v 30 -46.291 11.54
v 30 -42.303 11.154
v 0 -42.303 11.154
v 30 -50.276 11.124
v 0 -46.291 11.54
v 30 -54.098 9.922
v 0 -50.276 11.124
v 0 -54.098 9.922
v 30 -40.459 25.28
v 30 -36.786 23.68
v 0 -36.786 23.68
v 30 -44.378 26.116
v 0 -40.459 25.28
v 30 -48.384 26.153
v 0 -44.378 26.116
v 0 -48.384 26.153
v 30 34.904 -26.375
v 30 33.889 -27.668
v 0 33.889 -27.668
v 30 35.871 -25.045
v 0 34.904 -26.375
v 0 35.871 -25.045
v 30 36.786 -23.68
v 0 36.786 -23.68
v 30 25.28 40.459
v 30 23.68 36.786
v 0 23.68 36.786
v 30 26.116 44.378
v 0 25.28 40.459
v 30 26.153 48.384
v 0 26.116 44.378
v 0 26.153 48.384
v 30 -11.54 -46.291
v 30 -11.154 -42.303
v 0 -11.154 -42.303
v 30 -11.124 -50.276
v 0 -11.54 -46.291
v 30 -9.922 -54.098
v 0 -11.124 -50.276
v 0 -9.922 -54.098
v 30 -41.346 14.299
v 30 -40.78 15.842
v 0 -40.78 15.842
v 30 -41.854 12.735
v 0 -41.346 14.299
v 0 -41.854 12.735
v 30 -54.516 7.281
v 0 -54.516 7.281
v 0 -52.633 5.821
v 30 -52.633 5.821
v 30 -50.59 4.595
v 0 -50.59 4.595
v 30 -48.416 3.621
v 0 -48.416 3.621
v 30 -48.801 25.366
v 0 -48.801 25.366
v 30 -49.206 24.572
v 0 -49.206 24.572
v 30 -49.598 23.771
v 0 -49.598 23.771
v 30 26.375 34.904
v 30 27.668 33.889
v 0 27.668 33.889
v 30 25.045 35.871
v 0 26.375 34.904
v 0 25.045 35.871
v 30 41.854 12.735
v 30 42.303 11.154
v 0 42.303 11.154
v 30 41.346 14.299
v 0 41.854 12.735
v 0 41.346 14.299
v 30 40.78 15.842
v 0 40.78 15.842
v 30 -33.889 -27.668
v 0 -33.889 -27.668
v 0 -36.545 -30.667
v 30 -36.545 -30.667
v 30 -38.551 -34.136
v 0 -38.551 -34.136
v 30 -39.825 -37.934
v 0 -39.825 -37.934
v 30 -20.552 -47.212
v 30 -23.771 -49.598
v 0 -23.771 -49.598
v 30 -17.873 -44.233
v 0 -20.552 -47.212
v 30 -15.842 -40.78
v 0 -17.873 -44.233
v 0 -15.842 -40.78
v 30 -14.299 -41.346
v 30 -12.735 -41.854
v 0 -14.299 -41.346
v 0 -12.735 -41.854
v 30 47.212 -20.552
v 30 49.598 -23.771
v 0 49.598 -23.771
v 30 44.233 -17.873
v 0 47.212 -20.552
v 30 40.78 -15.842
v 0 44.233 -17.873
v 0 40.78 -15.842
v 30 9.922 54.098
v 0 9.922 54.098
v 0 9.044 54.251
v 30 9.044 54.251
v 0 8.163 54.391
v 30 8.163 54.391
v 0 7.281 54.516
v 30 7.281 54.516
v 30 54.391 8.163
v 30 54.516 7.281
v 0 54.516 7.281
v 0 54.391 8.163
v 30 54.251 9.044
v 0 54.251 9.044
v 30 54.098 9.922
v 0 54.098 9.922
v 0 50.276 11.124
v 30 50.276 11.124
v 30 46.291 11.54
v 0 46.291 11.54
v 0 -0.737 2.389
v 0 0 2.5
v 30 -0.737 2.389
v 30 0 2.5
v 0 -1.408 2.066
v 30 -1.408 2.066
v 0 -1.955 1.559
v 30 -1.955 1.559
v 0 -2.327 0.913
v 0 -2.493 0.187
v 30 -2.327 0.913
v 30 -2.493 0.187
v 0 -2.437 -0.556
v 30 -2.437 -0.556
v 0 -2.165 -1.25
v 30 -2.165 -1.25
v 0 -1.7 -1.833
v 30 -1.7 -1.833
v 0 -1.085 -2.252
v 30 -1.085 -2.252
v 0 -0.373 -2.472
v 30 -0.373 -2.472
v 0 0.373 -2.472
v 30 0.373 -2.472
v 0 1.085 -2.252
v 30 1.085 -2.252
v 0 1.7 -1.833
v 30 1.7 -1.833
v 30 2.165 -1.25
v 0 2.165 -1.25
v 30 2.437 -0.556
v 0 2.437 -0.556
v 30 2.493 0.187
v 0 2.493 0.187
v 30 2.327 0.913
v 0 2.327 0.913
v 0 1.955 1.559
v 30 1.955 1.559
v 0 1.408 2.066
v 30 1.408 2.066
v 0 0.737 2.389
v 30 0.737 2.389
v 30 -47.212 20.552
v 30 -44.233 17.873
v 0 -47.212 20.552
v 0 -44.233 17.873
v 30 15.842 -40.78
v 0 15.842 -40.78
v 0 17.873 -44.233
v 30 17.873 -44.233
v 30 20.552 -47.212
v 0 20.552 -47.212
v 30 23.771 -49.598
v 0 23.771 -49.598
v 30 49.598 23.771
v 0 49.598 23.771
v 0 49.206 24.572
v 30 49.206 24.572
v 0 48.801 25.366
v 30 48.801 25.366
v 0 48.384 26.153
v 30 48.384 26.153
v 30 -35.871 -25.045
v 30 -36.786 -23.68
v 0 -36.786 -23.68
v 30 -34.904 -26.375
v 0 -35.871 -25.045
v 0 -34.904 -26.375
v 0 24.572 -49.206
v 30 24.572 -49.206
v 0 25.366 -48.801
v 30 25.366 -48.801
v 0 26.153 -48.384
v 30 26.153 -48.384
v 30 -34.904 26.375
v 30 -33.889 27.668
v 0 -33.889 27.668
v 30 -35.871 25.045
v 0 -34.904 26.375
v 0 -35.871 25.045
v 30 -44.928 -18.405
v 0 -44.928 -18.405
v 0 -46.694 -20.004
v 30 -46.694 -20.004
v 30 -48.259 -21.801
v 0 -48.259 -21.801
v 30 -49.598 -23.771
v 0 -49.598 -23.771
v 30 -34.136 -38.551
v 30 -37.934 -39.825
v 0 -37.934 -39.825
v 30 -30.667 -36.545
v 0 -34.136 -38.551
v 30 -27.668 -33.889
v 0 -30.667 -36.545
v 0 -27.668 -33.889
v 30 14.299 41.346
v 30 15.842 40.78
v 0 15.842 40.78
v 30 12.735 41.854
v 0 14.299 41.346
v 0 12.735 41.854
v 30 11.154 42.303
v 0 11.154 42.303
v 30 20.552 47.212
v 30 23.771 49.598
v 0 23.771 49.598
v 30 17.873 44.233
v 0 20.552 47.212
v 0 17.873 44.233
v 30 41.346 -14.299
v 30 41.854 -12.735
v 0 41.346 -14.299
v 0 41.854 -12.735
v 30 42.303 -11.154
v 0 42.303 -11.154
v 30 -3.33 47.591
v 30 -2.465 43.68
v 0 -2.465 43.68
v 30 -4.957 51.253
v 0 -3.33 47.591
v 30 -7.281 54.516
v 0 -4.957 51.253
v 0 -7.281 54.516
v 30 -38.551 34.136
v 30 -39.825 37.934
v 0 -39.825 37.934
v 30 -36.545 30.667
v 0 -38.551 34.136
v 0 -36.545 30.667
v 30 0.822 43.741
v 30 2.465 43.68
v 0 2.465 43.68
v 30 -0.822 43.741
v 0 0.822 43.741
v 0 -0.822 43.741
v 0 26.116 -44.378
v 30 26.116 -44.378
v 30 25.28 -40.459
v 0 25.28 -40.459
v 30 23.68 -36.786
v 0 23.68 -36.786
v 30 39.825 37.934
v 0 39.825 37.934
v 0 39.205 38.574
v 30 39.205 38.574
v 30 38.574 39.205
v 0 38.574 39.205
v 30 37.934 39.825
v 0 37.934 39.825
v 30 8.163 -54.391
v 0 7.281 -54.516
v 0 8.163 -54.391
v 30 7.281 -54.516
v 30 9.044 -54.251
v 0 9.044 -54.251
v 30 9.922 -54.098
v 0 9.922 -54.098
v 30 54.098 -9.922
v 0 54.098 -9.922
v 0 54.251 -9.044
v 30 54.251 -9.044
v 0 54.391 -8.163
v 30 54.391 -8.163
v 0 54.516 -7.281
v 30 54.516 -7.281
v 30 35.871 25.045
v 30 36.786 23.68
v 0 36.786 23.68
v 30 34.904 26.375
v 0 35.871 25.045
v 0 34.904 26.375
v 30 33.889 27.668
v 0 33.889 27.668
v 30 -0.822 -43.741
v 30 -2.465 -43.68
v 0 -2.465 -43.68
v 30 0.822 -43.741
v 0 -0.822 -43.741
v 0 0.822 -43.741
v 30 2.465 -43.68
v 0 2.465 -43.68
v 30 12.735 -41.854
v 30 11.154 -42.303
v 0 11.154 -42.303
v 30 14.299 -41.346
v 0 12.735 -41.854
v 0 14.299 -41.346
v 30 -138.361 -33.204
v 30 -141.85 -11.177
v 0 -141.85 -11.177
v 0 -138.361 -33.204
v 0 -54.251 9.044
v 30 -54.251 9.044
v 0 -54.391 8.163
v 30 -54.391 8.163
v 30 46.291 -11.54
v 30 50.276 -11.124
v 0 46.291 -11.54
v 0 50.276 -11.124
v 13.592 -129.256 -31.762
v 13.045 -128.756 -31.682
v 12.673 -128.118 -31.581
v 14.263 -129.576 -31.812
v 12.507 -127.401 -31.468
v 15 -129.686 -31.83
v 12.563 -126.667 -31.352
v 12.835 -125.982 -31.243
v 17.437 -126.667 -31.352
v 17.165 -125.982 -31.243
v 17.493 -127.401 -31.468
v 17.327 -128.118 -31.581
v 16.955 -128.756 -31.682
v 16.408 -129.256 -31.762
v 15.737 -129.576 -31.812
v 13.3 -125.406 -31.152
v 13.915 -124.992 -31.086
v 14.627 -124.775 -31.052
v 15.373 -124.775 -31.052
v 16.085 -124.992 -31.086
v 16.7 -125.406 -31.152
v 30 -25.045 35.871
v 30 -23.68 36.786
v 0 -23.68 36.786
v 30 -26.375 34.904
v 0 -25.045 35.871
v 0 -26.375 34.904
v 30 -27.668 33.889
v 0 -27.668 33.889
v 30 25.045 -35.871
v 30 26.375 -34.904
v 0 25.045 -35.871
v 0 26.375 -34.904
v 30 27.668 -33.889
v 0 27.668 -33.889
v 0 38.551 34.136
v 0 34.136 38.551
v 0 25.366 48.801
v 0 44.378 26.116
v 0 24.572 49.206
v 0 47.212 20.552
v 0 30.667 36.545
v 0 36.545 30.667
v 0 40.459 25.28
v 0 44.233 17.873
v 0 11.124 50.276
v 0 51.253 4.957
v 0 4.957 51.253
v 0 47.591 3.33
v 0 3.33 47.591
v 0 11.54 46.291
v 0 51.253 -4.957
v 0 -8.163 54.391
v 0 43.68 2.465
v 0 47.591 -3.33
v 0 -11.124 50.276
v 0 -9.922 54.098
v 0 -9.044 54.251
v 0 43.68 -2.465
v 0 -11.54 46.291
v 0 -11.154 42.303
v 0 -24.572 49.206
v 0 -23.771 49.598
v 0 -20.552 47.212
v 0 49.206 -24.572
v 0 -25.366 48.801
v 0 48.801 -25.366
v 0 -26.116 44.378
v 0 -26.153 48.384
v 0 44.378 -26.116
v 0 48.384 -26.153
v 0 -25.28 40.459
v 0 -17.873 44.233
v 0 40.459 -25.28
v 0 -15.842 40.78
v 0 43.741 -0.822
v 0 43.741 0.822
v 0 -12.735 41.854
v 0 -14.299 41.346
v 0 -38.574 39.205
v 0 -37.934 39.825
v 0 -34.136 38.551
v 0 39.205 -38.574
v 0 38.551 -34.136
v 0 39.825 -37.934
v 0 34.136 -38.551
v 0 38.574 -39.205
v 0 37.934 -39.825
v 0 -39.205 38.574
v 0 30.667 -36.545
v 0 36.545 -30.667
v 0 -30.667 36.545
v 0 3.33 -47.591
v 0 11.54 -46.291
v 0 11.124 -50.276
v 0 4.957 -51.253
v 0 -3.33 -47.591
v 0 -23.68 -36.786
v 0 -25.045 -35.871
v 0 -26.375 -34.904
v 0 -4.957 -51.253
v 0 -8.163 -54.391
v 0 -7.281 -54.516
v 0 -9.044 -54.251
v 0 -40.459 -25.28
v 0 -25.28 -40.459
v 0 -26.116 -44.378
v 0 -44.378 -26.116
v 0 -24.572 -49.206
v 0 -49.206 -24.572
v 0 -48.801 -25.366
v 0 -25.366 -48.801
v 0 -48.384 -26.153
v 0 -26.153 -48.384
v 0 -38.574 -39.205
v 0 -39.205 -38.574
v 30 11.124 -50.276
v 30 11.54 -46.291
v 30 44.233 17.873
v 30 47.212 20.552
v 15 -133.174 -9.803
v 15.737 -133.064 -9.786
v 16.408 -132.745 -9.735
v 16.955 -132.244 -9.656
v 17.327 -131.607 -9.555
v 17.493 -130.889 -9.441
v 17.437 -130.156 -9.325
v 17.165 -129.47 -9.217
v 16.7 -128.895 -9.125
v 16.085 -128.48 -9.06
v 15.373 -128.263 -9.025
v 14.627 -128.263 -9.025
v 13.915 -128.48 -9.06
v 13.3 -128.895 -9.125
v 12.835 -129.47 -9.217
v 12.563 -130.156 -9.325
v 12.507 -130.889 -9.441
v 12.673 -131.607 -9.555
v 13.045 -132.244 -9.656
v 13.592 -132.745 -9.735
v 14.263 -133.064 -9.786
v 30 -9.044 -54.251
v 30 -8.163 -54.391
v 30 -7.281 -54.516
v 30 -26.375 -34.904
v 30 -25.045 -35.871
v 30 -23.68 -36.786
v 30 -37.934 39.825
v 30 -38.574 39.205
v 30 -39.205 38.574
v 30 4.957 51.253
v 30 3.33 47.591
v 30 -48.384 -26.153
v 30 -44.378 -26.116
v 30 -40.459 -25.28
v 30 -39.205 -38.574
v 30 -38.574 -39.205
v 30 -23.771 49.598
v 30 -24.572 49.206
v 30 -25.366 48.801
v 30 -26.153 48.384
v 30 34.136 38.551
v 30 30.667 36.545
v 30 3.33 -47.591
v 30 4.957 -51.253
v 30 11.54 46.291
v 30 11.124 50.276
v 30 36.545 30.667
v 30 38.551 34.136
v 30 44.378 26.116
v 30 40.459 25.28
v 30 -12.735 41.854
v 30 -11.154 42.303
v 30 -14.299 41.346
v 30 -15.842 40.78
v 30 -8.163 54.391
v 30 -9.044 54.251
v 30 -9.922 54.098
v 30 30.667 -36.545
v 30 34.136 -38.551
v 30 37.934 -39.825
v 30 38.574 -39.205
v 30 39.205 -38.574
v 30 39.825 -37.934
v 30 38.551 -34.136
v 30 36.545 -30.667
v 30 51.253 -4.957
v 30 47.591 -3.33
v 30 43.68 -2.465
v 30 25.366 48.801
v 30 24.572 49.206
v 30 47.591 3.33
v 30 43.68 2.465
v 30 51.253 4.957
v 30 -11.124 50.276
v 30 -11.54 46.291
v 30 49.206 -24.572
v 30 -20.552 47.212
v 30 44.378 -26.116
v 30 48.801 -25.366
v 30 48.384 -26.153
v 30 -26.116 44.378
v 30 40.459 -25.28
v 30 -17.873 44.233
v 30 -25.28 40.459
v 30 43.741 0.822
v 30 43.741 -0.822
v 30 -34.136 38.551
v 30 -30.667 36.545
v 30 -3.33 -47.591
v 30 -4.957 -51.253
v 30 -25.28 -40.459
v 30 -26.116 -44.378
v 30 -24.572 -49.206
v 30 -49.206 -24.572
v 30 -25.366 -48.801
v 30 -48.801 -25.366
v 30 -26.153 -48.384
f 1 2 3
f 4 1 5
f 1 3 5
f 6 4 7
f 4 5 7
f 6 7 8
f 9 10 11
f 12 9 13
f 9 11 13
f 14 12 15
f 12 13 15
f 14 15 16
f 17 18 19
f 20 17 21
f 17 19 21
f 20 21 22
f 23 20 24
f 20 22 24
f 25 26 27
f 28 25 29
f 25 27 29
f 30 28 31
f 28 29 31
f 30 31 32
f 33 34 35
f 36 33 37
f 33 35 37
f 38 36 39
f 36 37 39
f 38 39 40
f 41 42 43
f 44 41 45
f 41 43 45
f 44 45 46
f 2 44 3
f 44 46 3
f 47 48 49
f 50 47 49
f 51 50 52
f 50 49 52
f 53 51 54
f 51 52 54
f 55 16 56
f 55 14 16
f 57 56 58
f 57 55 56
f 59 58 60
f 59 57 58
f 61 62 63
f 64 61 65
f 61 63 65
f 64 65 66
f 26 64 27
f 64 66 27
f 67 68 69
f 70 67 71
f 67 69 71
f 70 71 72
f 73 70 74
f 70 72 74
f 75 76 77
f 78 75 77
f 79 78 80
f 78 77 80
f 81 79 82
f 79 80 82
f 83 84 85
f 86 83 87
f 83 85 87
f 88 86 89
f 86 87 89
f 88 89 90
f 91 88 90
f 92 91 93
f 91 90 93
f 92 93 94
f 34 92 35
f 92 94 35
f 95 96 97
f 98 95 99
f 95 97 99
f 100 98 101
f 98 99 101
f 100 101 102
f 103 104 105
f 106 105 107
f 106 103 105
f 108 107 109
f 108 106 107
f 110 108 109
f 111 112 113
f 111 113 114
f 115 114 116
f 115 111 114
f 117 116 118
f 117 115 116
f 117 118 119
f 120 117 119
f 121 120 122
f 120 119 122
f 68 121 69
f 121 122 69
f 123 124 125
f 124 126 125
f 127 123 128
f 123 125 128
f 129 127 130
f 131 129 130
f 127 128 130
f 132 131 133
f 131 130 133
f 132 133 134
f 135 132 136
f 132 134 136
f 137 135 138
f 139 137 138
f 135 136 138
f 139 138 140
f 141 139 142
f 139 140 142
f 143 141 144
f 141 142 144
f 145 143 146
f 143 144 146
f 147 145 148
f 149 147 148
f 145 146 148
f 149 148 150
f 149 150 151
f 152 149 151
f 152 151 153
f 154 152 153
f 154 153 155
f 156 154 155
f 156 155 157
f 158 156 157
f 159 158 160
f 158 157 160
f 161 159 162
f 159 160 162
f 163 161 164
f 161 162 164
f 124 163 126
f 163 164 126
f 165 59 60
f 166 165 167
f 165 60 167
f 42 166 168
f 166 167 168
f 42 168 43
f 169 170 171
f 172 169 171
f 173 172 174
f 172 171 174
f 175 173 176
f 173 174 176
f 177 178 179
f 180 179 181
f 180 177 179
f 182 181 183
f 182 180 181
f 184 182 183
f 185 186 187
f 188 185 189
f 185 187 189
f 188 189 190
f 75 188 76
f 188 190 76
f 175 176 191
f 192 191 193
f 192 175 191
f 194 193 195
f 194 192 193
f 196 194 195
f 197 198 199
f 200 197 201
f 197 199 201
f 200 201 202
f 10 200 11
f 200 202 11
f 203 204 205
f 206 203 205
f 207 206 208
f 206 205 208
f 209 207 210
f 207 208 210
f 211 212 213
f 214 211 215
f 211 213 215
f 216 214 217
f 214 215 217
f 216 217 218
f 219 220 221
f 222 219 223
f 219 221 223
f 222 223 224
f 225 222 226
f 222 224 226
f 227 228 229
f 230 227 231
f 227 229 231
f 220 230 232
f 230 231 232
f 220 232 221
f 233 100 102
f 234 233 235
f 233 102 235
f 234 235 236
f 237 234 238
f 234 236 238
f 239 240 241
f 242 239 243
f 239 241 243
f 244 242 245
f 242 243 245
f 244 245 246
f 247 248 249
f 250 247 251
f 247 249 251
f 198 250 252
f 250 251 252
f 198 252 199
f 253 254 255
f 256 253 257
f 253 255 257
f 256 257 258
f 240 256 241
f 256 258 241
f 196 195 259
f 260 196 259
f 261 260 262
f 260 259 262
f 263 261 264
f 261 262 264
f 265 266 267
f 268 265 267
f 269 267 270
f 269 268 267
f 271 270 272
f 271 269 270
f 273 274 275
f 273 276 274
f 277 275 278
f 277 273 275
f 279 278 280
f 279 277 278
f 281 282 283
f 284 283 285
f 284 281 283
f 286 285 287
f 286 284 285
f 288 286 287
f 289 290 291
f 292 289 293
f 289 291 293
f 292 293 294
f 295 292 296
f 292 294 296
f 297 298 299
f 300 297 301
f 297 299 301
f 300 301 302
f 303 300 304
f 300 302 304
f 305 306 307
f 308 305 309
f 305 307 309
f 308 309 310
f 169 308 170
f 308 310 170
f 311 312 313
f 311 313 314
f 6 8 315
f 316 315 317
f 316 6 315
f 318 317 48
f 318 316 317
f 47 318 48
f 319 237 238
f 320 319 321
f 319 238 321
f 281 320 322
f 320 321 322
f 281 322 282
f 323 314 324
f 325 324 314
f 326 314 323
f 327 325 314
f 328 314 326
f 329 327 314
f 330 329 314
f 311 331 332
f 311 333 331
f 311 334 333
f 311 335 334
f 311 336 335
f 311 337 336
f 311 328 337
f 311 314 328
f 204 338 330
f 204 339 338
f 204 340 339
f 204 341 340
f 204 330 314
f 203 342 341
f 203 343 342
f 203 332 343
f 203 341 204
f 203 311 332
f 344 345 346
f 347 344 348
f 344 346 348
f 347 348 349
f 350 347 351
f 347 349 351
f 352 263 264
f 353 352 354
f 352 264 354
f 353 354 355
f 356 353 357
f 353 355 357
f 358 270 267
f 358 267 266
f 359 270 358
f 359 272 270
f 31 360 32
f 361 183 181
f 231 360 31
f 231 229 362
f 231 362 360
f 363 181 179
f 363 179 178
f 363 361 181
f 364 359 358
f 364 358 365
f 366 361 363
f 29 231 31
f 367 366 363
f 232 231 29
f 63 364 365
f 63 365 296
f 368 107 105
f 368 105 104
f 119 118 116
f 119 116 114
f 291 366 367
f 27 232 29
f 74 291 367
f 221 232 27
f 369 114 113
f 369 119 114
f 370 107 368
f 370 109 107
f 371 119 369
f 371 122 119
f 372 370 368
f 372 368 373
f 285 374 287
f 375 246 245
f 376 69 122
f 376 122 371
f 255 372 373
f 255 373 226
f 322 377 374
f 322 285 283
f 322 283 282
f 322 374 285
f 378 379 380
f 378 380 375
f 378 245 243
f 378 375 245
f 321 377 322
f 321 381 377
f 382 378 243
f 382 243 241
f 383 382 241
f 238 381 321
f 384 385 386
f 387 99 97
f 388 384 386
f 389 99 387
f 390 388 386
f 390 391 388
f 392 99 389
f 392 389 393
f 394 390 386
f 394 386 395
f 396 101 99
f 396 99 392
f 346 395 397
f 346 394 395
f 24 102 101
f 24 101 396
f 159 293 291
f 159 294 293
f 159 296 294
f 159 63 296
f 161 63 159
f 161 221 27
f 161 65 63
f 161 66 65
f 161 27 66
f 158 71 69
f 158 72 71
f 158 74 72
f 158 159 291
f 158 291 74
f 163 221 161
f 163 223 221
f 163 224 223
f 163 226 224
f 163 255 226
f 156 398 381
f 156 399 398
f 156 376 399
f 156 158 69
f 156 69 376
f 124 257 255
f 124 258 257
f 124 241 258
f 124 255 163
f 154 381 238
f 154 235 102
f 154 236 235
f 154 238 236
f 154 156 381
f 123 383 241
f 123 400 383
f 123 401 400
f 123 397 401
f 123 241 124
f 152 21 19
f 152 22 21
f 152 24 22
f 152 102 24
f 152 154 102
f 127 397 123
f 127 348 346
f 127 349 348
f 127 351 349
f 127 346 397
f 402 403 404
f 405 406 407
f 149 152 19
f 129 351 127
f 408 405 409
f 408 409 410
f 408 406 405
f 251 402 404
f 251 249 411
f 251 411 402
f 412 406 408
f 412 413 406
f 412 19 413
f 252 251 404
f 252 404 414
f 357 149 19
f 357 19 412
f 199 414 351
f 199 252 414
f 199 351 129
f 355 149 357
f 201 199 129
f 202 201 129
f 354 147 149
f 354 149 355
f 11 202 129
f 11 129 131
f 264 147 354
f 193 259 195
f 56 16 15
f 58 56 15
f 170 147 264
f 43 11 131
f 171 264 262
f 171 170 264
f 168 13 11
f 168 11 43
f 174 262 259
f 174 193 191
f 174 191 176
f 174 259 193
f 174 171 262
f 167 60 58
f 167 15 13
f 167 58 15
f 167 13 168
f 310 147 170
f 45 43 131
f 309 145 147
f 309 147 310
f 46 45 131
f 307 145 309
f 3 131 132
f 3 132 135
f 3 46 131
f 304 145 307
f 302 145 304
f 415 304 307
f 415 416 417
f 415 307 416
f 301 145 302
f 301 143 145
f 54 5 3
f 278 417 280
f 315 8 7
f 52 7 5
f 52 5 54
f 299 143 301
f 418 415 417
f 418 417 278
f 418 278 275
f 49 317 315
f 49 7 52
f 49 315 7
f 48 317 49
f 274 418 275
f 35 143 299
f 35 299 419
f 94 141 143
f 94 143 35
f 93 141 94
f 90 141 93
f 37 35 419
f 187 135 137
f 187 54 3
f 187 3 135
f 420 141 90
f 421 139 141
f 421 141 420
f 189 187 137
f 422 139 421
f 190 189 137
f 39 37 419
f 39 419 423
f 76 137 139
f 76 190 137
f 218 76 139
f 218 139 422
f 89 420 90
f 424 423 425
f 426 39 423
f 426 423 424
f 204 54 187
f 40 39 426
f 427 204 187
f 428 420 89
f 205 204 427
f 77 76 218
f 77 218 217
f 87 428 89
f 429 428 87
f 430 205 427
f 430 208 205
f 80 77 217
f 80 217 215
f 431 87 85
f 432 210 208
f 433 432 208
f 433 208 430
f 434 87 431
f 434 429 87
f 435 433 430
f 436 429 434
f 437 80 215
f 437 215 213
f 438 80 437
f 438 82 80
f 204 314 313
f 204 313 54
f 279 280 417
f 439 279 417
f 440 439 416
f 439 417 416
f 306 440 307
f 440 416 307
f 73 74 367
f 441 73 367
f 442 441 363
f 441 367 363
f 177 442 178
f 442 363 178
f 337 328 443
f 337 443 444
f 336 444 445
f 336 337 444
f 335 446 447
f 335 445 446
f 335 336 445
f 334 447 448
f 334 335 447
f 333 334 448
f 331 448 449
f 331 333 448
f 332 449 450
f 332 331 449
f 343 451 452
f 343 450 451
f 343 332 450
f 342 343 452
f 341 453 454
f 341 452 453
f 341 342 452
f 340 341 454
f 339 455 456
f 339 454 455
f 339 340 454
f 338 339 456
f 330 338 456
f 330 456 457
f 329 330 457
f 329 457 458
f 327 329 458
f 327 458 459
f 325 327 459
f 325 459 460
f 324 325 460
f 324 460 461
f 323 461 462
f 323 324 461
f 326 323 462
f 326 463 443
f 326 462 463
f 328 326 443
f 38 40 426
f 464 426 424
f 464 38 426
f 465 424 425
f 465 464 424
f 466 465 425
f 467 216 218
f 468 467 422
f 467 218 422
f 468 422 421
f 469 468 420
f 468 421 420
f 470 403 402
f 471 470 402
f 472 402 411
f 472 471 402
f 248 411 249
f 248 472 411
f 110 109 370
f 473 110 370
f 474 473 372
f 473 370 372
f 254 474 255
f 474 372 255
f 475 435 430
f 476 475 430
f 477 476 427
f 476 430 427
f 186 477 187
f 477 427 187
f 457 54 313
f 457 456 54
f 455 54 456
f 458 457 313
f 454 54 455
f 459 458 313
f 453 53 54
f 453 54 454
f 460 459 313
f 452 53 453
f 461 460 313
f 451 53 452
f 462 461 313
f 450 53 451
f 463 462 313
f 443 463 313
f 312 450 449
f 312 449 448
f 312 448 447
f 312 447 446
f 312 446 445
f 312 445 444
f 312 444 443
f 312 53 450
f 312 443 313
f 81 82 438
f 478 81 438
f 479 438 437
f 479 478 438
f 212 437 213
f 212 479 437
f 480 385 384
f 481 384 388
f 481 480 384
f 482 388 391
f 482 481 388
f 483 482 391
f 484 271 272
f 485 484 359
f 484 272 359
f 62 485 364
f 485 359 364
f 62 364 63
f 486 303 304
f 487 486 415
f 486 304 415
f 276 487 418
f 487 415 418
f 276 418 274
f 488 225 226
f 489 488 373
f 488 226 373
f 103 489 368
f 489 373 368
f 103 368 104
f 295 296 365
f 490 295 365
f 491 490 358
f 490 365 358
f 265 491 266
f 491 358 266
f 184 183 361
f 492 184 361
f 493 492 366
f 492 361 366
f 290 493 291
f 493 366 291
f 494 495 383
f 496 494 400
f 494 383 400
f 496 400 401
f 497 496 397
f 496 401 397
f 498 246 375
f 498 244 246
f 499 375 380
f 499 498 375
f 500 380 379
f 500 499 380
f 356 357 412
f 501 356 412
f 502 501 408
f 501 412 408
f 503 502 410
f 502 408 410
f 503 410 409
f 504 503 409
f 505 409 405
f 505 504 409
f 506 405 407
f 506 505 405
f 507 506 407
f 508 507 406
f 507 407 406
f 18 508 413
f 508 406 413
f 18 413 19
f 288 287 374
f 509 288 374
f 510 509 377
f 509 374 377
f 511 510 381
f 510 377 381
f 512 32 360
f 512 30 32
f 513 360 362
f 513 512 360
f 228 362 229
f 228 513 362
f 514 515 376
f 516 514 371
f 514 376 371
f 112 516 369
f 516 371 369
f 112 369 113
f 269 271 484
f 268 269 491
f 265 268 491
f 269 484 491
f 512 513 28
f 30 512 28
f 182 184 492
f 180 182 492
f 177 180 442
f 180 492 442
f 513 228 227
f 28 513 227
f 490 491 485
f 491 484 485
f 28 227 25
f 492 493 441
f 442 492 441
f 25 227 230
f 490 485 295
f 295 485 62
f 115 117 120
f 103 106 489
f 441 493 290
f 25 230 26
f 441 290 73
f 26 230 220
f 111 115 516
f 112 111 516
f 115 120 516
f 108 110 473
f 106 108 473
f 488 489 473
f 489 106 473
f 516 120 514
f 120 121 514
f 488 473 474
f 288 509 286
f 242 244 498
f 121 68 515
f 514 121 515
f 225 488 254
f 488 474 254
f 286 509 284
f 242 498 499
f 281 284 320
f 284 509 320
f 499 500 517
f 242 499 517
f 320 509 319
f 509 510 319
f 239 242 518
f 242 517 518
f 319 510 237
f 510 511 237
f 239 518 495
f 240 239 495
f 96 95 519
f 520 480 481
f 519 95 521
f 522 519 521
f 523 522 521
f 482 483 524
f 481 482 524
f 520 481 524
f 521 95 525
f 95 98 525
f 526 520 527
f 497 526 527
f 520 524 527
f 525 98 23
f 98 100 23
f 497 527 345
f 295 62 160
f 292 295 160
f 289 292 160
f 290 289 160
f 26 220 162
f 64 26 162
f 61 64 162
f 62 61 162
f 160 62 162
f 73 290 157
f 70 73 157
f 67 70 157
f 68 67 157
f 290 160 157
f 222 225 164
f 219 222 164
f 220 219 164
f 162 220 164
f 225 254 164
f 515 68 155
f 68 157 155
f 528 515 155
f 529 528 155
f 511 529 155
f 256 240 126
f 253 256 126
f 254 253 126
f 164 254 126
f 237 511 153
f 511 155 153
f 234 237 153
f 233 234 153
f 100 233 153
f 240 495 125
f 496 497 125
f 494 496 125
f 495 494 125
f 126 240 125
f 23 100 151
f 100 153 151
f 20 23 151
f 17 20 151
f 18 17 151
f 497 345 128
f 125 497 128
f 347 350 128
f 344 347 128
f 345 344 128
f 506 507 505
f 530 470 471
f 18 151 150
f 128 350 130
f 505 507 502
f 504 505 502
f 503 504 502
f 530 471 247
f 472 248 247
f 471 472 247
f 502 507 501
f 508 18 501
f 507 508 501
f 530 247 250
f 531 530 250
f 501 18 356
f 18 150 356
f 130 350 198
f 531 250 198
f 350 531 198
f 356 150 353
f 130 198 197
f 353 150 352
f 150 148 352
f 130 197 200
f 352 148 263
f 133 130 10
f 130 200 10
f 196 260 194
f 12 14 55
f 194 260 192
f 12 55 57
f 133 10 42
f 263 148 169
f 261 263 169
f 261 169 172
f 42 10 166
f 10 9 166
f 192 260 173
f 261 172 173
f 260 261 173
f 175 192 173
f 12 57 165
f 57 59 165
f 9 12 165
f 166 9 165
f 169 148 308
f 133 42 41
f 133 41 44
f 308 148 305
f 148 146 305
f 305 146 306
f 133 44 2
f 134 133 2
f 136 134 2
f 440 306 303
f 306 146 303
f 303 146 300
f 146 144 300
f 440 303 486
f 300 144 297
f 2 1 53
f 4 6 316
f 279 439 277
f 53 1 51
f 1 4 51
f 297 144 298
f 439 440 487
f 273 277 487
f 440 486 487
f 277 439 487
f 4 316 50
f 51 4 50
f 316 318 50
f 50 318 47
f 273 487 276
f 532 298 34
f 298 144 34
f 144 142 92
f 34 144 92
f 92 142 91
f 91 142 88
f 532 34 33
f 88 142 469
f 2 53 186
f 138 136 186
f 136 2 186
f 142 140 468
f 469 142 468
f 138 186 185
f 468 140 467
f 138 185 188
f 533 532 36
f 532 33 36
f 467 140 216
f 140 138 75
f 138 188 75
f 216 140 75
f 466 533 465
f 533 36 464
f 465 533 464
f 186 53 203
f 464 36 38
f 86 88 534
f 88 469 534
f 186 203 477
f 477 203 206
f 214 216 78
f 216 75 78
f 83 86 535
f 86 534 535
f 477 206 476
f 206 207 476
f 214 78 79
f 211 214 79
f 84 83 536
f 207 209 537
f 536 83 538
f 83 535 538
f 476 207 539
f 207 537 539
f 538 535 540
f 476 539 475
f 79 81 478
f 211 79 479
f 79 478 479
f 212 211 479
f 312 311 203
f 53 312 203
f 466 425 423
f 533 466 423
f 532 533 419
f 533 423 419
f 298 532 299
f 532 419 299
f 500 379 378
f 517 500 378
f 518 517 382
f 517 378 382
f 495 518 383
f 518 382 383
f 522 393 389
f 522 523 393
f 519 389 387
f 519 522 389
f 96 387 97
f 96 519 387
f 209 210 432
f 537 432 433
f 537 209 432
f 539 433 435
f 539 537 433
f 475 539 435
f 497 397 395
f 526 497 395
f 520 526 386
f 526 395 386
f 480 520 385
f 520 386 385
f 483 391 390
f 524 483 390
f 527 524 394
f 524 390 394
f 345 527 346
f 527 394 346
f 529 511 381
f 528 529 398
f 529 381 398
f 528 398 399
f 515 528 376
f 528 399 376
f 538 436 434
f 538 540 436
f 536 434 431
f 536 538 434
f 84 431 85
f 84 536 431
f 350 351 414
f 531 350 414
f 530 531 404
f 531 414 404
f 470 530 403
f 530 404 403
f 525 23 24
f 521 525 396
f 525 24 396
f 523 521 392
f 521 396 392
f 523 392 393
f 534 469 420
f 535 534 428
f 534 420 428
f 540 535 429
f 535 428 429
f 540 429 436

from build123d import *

# Parameters (mm, degrees)
BASPROSKE_W              = 30
BASPROSKE_H              = 55
TOOTHCUT_DEPTH           = 84.366660003
TEETHCUTS_COUNT          = 20
BORSKE_R                 = 2.5
BORE_DEPTH               = 50.0000508
EXTRUDE_1_DEPTH          = 30
CUT_EXTRUDE_1_DEPTH      = 158.555338193
CUT_EXTRUDE_1_DEPTH_BACK = 158.555338193
SKETCH_7_R               = 2.5


with BuildPart() as part:
    # BasProSke → Base-Revolve (revolve)
    with BuildSketch(Plane(origin=(0, 0, 0), x_dir=(1, 0, 0), z_dir=(0, 1, 0)), mode=Mode.PRIVATE) as base_revolve_sk:
        with Locations((15, 27.5)):
            Rectangle(BASPROSKE_W, BASPROSKE_H)
    revolve(base_revolve_sk.sketch.rotate(Axis((-10, 0, 0), (1, 0, 0)), 180), axis=Axis((-10, 0, 0), (1, 0, 0)))

    # TooCutSke → ToothCut (cut, through all)
    with BuildSketch(Plane(origin=(0, 0, 0), x_dir=(0, 0, -1), z_dir=(1, 0, 0))):
        with BuildLine():
            ThreePointArc((2.464838288, 43.679509764), (0, 43.749), (-2.464838288, 43.679509764))
            ThreePointArc((-2.464838288, 43.679509764), (-4.057398861, 49.476814676), (-7.300899231, 54.538899105))
            ThreePointArc((-7.300899231, 54.538899105), (0, 55.0254), (7.300899231, 54.538899105))
            ThreePointArc((7.300899231, 54.538899105), (4.057398861, 49.476814676), (2.464838288, 43.679509764))
        make_face()
    toothcut = extrude(amount=TOOTHCUT_DEPTH, mode=Mode.SUBTRACT)

    # TeethCuts: ToothCut ×20 about axis
    teethcuts_axis = Axis((0, 0, 0), (1, 0, 0))
    for i in range(1, TEETHCUTS_COUNT):
        add(toothcut.rotate(teethcuts_axis, i * 360 / TEETHCUTS_COUNT), mode=Mode.SUBTRACT)

    # BorSke → Bore (cut, symmetric)
    with BuildSketch(Plane(origin=(0, 0, 0), x_dir=(0, 0, -1), z_dir=(1, 0, 0))):
        with Locations(Location((0, 0, 0), (0, 0, 180))):
            Circle(BORSKE_R)
    extrude(amount=BORE_DEPTH, both=True, mode=Mode.SUBTRACT)

    # 草图6 → 凸台-拉伸1 (add)
    with BuildSketch(Plane(origin=(30, 0, 0), x_dir=(0, 0, -1), z_dir=(1, 0, 0))):
        with BuildLine():
            Line((-4.466100318, -43.081201999), (11.177346186, -141.850036058))
            Line((11.177346186, -141.850036058), (33.20378387, -138.361391053))
            Line((33.20378387, -138.361391053), (17.560337366, -39.592556994))
            ThreePointArc((17.560337366, -39.592556994), (6.77314241, -42.763938152), (-4.466100318, -43.081201999))
        make_face()
    extrude(amount=-EXTRUDE_1_DEPTH)

    # 草图7 → 切除-拉伸1 (cut, two sides: drawn at the far end of the back side and taken through both)
    with BuildSketch(Plane(origin=(0, -1.744322502, 11.013218842), x_dir=(1, 0, 0), z_dir=(0, -0.15643446504023845, 0.9876883405951365)).offset(-CUT_EXTRUDE_1_DEPTH_BACK)):
        with Locations(Location((15, -130.568148899, 0), (0, 0, 270))):
            Circle(SKETCH_7_R)
    extrude(amount=CUT_EXTRUDE_1_DEPTH + CUT_EXTRUDE_1_DEPTH_BACK, mode=Mode.SUBTRACT)


solid = part.part
